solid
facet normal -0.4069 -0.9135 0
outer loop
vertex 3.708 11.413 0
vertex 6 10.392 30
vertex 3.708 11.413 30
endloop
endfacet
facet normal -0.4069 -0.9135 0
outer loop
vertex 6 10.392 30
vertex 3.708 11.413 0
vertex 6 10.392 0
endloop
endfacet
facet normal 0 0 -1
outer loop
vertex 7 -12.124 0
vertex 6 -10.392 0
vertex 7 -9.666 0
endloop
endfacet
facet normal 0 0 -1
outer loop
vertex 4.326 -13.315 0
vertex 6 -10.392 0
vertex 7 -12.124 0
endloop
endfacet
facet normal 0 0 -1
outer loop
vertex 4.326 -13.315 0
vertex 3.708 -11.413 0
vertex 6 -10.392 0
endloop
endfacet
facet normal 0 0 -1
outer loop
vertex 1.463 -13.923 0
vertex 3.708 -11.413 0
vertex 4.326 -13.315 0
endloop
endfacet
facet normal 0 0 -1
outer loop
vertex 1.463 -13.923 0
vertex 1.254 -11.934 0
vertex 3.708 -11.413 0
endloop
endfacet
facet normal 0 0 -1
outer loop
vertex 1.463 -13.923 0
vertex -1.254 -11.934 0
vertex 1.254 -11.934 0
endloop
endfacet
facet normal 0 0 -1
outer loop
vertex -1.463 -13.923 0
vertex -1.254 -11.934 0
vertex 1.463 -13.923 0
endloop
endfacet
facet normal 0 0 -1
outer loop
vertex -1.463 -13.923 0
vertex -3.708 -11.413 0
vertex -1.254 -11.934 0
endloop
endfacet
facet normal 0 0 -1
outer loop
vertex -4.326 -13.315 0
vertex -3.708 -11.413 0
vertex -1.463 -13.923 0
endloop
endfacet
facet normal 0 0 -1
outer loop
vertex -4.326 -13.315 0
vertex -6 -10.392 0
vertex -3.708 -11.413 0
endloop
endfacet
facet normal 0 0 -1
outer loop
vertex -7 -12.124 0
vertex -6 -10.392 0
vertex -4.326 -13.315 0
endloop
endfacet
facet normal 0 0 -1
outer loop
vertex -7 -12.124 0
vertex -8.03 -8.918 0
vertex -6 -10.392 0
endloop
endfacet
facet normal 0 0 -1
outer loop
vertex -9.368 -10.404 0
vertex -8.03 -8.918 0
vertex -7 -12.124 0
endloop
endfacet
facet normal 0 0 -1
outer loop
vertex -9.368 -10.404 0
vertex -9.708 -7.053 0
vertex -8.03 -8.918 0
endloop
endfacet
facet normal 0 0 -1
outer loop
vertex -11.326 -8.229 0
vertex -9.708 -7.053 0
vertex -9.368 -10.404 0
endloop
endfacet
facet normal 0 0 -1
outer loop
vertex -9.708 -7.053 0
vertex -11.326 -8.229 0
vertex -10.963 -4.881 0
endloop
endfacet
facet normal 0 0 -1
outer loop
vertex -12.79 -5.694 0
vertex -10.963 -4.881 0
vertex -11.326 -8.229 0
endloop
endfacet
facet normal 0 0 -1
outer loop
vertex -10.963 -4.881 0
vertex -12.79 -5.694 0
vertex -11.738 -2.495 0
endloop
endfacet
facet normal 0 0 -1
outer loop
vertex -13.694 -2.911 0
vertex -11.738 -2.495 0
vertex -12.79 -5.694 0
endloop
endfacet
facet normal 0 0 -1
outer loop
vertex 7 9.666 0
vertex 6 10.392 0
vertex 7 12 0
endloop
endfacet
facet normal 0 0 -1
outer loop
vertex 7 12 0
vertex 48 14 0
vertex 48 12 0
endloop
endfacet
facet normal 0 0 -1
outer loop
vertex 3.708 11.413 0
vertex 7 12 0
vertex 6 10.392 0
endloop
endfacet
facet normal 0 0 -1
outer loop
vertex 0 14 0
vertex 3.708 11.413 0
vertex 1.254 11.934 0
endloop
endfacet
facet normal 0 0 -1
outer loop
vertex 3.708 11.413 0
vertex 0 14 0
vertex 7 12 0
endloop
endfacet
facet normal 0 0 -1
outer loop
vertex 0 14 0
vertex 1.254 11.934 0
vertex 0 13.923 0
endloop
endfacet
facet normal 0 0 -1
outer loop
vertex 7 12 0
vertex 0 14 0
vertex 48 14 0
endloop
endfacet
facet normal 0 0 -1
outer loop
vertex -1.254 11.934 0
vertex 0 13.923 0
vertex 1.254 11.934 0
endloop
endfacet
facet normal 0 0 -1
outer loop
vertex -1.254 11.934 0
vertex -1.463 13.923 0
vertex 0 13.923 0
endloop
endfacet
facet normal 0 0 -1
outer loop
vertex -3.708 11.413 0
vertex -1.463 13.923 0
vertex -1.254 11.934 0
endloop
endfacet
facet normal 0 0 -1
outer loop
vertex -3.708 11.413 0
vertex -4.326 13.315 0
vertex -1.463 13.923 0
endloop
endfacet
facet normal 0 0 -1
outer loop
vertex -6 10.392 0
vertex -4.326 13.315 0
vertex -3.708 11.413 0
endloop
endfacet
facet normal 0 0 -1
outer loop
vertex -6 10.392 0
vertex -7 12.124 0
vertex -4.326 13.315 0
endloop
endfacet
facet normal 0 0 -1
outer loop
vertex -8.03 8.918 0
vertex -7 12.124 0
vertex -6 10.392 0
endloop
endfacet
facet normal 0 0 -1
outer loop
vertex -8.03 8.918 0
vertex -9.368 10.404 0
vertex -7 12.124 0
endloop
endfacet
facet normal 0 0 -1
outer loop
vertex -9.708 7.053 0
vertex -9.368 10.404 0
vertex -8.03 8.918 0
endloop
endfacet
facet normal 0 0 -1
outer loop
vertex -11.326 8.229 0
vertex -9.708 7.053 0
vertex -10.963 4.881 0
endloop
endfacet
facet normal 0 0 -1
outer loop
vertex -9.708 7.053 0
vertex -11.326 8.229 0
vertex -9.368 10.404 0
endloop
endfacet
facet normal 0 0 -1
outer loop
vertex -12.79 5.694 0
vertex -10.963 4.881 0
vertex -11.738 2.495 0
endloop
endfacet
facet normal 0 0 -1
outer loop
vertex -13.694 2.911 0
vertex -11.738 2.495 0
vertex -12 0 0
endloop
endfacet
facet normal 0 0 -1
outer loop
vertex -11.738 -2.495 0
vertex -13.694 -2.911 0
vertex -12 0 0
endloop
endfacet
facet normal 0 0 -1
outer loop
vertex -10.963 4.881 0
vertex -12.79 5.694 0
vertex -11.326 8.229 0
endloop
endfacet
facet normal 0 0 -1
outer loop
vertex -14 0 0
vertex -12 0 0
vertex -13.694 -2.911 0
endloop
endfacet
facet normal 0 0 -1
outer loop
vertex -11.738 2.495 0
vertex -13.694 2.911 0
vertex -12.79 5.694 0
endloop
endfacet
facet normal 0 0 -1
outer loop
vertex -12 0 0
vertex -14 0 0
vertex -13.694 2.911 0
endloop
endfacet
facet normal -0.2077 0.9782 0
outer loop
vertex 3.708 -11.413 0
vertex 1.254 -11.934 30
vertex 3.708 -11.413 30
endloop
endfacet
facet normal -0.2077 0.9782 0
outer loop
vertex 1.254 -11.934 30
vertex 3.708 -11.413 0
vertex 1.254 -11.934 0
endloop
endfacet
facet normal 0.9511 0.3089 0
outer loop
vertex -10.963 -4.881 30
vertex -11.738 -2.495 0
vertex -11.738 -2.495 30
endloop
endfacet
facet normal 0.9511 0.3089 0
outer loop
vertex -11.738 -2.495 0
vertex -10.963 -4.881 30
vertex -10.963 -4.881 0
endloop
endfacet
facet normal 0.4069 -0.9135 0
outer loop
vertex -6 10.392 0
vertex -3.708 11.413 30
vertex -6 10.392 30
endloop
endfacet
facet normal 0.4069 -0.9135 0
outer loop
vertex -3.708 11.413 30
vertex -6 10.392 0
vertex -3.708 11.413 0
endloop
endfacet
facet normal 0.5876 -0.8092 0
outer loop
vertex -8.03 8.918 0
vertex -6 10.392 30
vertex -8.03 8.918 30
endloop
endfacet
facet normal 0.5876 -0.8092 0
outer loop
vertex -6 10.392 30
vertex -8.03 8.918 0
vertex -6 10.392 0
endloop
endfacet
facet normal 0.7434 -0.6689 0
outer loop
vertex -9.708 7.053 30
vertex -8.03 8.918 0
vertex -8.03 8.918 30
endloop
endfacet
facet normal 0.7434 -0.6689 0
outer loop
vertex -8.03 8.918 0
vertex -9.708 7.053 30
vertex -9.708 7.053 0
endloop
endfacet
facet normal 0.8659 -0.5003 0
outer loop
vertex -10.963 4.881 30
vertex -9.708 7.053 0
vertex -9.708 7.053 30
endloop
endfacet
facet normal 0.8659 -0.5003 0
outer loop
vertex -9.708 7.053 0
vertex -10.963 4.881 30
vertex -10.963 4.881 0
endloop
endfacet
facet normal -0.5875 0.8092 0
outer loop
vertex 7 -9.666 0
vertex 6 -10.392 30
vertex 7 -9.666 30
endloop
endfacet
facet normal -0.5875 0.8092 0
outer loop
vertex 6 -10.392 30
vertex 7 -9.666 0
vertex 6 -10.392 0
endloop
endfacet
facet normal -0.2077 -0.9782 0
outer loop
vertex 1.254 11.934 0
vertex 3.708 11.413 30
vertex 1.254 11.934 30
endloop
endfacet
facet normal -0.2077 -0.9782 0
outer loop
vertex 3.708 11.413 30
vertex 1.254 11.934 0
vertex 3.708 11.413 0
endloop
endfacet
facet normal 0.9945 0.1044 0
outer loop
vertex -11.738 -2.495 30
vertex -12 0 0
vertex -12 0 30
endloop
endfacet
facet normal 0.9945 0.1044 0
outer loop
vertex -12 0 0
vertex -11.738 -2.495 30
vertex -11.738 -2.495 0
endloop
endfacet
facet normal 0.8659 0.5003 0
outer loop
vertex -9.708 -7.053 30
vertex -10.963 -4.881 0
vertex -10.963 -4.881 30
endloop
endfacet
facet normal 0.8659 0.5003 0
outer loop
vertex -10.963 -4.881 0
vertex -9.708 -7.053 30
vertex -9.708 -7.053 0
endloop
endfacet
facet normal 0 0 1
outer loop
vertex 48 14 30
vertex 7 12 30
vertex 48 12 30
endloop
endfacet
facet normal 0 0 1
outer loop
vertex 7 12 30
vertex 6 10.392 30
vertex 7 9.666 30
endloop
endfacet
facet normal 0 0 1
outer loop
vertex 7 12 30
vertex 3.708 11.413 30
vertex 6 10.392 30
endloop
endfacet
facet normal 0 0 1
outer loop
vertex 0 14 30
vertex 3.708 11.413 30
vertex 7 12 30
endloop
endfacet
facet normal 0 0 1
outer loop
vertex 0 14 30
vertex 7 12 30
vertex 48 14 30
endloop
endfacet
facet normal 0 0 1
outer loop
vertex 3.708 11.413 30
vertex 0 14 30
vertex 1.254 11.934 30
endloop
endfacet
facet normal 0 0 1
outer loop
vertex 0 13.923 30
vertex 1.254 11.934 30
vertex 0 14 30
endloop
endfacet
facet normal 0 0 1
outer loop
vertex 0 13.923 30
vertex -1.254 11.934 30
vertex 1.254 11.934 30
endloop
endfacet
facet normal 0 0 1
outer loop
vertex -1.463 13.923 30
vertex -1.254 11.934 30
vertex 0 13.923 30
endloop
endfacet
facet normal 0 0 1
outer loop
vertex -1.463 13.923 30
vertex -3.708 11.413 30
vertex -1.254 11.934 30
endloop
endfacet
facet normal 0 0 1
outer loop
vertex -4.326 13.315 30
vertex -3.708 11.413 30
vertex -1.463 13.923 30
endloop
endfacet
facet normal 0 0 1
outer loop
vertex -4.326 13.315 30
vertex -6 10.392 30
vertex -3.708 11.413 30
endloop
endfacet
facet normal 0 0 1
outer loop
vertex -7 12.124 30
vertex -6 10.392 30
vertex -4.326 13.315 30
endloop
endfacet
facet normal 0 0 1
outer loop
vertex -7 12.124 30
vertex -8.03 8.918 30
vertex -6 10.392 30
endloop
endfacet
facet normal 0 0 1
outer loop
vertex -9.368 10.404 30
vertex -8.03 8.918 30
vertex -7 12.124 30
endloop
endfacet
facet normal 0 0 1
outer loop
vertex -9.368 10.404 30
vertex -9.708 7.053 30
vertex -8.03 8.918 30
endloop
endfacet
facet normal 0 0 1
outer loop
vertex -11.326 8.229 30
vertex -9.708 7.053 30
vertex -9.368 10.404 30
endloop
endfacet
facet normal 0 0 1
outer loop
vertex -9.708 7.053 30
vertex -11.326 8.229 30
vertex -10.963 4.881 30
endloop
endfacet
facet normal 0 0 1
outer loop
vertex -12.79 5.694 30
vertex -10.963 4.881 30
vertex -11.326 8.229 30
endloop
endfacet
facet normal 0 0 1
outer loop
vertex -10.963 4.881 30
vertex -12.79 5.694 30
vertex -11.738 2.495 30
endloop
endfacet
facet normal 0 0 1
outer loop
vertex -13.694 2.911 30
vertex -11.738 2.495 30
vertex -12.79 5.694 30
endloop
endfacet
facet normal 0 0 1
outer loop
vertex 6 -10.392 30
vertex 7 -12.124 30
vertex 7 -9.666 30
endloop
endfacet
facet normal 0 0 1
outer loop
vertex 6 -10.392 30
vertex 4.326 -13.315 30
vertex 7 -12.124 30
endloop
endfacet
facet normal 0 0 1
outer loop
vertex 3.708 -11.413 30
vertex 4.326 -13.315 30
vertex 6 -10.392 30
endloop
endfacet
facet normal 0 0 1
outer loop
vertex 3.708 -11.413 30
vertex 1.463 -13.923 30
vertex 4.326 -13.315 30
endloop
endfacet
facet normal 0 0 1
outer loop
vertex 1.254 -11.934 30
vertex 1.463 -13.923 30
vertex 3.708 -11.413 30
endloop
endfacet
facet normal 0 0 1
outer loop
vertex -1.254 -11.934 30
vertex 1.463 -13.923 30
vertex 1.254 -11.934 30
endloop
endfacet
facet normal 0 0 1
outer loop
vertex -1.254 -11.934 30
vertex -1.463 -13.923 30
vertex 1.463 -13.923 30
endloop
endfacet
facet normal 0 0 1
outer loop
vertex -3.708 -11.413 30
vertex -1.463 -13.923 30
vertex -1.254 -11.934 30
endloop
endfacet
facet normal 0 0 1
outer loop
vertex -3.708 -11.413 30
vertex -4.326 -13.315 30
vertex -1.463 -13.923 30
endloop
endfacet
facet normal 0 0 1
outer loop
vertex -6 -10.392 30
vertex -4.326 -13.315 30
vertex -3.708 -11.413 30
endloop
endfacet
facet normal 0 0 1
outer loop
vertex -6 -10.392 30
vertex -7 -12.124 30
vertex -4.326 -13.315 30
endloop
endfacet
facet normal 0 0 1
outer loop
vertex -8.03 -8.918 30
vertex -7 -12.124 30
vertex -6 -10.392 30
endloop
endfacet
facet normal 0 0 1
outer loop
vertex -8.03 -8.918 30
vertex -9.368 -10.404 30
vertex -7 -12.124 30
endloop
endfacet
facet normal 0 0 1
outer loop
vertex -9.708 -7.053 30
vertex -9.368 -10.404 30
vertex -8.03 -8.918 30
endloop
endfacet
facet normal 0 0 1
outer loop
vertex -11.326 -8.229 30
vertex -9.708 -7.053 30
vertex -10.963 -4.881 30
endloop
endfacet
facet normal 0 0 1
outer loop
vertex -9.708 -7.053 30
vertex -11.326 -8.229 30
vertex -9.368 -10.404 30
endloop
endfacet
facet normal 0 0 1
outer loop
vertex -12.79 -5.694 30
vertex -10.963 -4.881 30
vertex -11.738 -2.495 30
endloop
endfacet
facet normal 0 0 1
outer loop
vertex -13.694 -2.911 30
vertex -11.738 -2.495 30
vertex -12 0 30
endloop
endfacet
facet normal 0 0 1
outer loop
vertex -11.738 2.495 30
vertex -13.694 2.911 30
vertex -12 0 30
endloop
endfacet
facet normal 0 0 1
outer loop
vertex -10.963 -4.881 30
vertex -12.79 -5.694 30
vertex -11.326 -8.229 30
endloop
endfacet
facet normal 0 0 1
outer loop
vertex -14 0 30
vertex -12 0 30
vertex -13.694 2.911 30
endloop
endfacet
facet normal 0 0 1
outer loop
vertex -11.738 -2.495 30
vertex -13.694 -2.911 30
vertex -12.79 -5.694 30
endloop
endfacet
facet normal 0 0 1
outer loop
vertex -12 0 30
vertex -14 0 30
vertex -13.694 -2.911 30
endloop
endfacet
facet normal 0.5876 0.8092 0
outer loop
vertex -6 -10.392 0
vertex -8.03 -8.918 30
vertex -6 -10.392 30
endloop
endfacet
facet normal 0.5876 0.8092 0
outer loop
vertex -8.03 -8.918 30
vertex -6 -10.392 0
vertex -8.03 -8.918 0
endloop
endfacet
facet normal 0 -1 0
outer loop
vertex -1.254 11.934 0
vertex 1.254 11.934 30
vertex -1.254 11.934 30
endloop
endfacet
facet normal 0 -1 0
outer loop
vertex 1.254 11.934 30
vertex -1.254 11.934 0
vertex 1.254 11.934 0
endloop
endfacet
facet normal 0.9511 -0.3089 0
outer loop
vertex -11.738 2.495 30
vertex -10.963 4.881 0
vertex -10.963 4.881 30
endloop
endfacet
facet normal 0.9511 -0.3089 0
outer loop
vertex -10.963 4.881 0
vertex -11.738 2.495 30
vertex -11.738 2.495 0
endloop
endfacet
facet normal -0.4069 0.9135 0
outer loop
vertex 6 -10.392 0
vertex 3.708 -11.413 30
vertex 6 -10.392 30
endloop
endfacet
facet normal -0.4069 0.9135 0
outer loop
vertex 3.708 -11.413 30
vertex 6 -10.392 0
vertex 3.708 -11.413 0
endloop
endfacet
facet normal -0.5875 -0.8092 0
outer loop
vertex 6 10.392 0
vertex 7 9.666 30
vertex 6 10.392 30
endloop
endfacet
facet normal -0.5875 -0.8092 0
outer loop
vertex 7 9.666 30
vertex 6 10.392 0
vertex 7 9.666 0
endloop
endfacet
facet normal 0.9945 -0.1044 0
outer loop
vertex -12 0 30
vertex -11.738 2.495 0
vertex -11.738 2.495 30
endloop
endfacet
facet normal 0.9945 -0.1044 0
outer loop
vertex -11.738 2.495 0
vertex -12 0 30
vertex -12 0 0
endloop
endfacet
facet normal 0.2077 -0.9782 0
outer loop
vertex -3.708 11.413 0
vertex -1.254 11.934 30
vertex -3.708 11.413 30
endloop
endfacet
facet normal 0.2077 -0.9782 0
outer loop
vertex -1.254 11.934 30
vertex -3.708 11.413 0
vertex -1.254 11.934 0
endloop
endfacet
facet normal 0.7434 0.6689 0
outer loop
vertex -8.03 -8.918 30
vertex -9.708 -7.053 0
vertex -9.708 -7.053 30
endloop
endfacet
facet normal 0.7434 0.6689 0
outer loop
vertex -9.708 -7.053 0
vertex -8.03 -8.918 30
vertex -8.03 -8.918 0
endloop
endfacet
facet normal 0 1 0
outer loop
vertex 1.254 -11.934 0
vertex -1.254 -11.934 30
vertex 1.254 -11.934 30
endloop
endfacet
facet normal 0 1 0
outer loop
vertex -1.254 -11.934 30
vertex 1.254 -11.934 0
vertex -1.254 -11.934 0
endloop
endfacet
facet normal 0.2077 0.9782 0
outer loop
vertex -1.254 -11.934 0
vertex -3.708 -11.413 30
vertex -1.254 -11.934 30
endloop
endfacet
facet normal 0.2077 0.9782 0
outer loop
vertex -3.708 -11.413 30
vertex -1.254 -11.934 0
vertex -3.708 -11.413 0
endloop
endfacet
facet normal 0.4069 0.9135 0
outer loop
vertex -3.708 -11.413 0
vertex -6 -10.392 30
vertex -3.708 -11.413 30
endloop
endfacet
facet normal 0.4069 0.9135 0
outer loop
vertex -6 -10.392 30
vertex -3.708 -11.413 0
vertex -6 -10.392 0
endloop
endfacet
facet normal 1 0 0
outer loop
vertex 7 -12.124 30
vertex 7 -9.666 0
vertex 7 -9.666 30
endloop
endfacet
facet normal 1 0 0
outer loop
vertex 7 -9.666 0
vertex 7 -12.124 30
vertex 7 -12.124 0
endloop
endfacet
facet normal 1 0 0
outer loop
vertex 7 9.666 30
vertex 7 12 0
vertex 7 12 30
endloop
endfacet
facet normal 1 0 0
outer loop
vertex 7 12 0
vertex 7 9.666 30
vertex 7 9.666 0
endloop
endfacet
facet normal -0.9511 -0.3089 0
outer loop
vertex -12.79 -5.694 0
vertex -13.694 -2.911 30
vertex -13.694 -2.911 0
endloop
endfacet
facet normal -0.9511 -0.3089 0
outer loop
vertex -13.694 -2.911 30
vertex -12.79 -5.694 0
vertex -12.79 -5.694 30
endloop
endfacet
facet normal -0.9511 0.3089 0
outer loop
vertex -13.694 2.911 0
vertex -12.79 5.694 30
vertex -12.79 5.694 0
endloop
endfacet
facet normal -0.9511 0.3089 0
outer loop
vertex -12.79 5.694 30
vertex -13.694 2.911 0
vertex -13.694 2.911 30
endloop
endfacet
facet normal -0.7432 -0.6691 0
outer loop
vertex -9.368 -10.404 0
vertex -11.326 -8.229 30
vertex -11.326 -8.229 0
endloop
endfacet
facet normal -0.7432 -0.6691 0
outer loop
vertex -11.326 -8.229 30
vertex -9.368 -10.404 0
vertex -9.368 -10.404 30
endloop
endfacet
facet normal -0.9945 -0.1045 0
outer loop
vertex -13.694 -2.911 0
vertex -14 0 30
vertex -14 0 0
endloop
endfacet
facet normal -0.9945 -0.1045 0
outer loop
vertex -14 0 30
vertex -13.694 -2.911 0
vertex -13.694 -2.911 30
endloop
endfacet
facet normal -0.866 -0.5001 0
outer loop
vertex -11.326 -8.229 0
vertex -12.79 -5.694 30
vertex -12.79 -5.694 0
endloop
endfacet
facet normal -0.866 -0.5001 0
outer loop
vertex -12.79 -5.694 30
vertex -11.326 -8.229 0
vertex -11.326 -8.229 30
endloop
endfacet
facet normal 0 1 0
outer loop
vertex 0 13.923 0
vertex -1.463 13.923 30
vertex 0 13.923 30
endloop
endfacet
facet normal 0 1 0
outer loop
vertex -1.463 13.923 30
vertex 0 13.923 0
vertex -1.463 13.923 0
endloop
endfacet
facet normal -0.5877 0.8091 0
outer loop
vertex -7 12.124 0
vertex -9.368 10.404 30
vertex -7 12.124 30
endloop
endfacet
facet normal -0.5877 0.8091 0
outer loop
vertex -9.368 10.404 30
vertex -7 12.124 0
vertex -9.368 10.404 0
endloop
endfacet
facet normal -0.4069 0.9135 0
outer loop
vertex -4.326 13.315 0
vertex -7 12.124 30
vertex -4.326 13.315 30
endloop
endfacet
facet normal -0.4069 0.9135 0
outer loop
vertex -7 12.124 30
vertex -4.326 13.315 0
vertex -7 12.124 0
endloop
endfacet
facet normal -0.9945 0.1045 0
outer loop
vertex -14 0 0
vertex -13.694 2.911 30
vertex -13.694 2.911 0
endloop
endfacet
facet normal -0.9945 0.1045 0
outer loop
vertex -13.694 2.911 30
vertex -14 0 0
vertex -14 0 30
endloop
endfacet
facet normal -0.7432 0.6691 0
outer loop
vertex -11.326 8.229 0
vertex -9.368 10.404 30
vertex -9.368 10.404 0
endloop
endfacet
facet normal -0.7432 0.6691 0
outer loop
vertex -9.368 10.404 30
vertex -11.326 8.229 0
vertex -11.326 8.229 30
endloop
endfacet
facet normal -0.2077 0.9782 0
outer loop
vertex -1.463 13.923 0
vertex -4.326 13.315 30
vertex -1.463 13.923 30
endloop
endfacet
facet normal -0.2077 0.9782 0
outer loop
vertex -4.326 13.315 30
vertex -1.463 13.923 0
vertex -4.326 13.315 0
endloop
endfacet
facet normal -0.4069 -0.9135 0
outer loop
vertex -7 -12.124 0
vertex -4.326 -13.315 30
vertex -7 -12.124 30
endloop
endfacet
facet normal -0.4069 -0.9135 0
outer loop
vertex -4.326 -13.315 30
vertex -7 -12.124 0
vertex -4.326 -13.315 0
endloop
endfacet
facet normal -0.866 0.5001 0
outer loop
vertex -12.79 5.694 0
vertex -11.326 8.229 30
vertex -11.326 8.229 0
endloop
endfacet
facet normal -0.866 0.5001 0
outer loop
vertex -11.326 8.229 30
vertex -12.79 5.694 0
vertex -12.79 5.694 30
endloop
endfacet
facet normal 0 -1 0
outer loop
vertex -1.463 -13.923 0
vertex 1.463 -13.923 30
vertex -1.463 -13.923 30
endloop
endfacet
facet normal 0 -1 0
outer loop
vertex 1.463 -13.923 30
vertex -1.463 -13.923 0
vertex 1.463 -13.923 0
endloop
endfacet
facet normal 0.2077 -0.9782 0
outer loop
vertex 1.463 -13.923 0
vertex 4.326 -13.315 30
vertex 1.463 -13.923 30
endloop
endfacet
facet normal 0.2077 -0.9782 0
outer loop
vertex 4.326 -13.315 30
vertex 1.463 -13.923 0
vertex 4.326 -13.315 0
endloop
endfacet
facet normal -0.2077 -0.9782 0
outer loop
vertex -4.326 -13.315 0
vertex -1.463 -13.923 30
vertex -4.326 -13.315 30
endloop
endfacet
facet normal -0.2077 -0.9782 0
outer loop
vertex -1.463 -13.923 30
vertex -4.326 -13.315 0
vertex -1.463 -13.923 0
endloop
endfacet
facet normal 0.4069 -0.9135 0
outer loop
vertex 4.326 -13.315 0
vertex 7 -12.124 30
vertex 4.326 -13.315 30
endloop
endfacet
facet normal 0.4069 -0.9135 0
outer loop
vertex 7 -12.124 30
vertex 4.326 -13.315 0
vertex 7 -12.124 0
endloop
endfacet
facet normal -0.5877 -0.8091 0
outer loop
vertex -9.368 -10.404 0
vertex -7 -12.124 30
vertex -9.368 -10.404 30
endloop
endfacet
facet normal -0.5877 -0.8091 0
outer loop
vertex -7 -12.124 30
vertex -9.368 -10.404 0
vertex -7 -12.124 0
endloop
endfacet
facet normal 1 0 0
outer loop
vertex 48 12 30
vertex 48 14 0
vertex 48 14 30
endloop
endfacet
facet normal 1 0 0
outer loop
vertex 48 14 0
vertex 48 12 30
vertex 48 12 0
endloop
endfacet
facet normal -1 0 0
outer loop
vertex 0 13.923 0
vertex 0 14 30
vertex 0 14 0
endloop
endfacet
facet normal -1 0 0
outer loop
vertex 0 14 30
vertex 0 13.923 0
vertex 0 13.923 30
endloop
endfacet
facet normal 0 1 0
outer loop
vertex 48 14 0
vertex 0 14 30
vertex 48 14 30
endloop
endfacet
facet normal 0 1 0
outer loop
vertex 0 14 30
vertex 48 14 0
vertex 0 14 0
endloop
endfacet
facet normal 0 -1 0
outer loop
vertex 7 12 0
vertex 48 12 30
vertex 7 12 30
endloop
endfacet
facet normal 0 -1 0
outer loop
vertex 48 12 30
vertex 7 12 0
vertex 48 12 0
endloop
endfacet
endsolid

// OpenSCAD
d1 = 24;
t1 = 2;
h1 = 30;

difference() {
    union() {
        cylinder(d=d1+2*t1, h=h1);
        
    }
    union() {
        cylinder(d=d1, h=h1);
        translate([(d1+2*t1)/4, -((d1+2*t1)/2), 0]) cube([d1+2*t1, d1+2*t1, h1]);
    }
}

translate([0, d1/2, 0]) cube([2*d1, t1, h1]);
